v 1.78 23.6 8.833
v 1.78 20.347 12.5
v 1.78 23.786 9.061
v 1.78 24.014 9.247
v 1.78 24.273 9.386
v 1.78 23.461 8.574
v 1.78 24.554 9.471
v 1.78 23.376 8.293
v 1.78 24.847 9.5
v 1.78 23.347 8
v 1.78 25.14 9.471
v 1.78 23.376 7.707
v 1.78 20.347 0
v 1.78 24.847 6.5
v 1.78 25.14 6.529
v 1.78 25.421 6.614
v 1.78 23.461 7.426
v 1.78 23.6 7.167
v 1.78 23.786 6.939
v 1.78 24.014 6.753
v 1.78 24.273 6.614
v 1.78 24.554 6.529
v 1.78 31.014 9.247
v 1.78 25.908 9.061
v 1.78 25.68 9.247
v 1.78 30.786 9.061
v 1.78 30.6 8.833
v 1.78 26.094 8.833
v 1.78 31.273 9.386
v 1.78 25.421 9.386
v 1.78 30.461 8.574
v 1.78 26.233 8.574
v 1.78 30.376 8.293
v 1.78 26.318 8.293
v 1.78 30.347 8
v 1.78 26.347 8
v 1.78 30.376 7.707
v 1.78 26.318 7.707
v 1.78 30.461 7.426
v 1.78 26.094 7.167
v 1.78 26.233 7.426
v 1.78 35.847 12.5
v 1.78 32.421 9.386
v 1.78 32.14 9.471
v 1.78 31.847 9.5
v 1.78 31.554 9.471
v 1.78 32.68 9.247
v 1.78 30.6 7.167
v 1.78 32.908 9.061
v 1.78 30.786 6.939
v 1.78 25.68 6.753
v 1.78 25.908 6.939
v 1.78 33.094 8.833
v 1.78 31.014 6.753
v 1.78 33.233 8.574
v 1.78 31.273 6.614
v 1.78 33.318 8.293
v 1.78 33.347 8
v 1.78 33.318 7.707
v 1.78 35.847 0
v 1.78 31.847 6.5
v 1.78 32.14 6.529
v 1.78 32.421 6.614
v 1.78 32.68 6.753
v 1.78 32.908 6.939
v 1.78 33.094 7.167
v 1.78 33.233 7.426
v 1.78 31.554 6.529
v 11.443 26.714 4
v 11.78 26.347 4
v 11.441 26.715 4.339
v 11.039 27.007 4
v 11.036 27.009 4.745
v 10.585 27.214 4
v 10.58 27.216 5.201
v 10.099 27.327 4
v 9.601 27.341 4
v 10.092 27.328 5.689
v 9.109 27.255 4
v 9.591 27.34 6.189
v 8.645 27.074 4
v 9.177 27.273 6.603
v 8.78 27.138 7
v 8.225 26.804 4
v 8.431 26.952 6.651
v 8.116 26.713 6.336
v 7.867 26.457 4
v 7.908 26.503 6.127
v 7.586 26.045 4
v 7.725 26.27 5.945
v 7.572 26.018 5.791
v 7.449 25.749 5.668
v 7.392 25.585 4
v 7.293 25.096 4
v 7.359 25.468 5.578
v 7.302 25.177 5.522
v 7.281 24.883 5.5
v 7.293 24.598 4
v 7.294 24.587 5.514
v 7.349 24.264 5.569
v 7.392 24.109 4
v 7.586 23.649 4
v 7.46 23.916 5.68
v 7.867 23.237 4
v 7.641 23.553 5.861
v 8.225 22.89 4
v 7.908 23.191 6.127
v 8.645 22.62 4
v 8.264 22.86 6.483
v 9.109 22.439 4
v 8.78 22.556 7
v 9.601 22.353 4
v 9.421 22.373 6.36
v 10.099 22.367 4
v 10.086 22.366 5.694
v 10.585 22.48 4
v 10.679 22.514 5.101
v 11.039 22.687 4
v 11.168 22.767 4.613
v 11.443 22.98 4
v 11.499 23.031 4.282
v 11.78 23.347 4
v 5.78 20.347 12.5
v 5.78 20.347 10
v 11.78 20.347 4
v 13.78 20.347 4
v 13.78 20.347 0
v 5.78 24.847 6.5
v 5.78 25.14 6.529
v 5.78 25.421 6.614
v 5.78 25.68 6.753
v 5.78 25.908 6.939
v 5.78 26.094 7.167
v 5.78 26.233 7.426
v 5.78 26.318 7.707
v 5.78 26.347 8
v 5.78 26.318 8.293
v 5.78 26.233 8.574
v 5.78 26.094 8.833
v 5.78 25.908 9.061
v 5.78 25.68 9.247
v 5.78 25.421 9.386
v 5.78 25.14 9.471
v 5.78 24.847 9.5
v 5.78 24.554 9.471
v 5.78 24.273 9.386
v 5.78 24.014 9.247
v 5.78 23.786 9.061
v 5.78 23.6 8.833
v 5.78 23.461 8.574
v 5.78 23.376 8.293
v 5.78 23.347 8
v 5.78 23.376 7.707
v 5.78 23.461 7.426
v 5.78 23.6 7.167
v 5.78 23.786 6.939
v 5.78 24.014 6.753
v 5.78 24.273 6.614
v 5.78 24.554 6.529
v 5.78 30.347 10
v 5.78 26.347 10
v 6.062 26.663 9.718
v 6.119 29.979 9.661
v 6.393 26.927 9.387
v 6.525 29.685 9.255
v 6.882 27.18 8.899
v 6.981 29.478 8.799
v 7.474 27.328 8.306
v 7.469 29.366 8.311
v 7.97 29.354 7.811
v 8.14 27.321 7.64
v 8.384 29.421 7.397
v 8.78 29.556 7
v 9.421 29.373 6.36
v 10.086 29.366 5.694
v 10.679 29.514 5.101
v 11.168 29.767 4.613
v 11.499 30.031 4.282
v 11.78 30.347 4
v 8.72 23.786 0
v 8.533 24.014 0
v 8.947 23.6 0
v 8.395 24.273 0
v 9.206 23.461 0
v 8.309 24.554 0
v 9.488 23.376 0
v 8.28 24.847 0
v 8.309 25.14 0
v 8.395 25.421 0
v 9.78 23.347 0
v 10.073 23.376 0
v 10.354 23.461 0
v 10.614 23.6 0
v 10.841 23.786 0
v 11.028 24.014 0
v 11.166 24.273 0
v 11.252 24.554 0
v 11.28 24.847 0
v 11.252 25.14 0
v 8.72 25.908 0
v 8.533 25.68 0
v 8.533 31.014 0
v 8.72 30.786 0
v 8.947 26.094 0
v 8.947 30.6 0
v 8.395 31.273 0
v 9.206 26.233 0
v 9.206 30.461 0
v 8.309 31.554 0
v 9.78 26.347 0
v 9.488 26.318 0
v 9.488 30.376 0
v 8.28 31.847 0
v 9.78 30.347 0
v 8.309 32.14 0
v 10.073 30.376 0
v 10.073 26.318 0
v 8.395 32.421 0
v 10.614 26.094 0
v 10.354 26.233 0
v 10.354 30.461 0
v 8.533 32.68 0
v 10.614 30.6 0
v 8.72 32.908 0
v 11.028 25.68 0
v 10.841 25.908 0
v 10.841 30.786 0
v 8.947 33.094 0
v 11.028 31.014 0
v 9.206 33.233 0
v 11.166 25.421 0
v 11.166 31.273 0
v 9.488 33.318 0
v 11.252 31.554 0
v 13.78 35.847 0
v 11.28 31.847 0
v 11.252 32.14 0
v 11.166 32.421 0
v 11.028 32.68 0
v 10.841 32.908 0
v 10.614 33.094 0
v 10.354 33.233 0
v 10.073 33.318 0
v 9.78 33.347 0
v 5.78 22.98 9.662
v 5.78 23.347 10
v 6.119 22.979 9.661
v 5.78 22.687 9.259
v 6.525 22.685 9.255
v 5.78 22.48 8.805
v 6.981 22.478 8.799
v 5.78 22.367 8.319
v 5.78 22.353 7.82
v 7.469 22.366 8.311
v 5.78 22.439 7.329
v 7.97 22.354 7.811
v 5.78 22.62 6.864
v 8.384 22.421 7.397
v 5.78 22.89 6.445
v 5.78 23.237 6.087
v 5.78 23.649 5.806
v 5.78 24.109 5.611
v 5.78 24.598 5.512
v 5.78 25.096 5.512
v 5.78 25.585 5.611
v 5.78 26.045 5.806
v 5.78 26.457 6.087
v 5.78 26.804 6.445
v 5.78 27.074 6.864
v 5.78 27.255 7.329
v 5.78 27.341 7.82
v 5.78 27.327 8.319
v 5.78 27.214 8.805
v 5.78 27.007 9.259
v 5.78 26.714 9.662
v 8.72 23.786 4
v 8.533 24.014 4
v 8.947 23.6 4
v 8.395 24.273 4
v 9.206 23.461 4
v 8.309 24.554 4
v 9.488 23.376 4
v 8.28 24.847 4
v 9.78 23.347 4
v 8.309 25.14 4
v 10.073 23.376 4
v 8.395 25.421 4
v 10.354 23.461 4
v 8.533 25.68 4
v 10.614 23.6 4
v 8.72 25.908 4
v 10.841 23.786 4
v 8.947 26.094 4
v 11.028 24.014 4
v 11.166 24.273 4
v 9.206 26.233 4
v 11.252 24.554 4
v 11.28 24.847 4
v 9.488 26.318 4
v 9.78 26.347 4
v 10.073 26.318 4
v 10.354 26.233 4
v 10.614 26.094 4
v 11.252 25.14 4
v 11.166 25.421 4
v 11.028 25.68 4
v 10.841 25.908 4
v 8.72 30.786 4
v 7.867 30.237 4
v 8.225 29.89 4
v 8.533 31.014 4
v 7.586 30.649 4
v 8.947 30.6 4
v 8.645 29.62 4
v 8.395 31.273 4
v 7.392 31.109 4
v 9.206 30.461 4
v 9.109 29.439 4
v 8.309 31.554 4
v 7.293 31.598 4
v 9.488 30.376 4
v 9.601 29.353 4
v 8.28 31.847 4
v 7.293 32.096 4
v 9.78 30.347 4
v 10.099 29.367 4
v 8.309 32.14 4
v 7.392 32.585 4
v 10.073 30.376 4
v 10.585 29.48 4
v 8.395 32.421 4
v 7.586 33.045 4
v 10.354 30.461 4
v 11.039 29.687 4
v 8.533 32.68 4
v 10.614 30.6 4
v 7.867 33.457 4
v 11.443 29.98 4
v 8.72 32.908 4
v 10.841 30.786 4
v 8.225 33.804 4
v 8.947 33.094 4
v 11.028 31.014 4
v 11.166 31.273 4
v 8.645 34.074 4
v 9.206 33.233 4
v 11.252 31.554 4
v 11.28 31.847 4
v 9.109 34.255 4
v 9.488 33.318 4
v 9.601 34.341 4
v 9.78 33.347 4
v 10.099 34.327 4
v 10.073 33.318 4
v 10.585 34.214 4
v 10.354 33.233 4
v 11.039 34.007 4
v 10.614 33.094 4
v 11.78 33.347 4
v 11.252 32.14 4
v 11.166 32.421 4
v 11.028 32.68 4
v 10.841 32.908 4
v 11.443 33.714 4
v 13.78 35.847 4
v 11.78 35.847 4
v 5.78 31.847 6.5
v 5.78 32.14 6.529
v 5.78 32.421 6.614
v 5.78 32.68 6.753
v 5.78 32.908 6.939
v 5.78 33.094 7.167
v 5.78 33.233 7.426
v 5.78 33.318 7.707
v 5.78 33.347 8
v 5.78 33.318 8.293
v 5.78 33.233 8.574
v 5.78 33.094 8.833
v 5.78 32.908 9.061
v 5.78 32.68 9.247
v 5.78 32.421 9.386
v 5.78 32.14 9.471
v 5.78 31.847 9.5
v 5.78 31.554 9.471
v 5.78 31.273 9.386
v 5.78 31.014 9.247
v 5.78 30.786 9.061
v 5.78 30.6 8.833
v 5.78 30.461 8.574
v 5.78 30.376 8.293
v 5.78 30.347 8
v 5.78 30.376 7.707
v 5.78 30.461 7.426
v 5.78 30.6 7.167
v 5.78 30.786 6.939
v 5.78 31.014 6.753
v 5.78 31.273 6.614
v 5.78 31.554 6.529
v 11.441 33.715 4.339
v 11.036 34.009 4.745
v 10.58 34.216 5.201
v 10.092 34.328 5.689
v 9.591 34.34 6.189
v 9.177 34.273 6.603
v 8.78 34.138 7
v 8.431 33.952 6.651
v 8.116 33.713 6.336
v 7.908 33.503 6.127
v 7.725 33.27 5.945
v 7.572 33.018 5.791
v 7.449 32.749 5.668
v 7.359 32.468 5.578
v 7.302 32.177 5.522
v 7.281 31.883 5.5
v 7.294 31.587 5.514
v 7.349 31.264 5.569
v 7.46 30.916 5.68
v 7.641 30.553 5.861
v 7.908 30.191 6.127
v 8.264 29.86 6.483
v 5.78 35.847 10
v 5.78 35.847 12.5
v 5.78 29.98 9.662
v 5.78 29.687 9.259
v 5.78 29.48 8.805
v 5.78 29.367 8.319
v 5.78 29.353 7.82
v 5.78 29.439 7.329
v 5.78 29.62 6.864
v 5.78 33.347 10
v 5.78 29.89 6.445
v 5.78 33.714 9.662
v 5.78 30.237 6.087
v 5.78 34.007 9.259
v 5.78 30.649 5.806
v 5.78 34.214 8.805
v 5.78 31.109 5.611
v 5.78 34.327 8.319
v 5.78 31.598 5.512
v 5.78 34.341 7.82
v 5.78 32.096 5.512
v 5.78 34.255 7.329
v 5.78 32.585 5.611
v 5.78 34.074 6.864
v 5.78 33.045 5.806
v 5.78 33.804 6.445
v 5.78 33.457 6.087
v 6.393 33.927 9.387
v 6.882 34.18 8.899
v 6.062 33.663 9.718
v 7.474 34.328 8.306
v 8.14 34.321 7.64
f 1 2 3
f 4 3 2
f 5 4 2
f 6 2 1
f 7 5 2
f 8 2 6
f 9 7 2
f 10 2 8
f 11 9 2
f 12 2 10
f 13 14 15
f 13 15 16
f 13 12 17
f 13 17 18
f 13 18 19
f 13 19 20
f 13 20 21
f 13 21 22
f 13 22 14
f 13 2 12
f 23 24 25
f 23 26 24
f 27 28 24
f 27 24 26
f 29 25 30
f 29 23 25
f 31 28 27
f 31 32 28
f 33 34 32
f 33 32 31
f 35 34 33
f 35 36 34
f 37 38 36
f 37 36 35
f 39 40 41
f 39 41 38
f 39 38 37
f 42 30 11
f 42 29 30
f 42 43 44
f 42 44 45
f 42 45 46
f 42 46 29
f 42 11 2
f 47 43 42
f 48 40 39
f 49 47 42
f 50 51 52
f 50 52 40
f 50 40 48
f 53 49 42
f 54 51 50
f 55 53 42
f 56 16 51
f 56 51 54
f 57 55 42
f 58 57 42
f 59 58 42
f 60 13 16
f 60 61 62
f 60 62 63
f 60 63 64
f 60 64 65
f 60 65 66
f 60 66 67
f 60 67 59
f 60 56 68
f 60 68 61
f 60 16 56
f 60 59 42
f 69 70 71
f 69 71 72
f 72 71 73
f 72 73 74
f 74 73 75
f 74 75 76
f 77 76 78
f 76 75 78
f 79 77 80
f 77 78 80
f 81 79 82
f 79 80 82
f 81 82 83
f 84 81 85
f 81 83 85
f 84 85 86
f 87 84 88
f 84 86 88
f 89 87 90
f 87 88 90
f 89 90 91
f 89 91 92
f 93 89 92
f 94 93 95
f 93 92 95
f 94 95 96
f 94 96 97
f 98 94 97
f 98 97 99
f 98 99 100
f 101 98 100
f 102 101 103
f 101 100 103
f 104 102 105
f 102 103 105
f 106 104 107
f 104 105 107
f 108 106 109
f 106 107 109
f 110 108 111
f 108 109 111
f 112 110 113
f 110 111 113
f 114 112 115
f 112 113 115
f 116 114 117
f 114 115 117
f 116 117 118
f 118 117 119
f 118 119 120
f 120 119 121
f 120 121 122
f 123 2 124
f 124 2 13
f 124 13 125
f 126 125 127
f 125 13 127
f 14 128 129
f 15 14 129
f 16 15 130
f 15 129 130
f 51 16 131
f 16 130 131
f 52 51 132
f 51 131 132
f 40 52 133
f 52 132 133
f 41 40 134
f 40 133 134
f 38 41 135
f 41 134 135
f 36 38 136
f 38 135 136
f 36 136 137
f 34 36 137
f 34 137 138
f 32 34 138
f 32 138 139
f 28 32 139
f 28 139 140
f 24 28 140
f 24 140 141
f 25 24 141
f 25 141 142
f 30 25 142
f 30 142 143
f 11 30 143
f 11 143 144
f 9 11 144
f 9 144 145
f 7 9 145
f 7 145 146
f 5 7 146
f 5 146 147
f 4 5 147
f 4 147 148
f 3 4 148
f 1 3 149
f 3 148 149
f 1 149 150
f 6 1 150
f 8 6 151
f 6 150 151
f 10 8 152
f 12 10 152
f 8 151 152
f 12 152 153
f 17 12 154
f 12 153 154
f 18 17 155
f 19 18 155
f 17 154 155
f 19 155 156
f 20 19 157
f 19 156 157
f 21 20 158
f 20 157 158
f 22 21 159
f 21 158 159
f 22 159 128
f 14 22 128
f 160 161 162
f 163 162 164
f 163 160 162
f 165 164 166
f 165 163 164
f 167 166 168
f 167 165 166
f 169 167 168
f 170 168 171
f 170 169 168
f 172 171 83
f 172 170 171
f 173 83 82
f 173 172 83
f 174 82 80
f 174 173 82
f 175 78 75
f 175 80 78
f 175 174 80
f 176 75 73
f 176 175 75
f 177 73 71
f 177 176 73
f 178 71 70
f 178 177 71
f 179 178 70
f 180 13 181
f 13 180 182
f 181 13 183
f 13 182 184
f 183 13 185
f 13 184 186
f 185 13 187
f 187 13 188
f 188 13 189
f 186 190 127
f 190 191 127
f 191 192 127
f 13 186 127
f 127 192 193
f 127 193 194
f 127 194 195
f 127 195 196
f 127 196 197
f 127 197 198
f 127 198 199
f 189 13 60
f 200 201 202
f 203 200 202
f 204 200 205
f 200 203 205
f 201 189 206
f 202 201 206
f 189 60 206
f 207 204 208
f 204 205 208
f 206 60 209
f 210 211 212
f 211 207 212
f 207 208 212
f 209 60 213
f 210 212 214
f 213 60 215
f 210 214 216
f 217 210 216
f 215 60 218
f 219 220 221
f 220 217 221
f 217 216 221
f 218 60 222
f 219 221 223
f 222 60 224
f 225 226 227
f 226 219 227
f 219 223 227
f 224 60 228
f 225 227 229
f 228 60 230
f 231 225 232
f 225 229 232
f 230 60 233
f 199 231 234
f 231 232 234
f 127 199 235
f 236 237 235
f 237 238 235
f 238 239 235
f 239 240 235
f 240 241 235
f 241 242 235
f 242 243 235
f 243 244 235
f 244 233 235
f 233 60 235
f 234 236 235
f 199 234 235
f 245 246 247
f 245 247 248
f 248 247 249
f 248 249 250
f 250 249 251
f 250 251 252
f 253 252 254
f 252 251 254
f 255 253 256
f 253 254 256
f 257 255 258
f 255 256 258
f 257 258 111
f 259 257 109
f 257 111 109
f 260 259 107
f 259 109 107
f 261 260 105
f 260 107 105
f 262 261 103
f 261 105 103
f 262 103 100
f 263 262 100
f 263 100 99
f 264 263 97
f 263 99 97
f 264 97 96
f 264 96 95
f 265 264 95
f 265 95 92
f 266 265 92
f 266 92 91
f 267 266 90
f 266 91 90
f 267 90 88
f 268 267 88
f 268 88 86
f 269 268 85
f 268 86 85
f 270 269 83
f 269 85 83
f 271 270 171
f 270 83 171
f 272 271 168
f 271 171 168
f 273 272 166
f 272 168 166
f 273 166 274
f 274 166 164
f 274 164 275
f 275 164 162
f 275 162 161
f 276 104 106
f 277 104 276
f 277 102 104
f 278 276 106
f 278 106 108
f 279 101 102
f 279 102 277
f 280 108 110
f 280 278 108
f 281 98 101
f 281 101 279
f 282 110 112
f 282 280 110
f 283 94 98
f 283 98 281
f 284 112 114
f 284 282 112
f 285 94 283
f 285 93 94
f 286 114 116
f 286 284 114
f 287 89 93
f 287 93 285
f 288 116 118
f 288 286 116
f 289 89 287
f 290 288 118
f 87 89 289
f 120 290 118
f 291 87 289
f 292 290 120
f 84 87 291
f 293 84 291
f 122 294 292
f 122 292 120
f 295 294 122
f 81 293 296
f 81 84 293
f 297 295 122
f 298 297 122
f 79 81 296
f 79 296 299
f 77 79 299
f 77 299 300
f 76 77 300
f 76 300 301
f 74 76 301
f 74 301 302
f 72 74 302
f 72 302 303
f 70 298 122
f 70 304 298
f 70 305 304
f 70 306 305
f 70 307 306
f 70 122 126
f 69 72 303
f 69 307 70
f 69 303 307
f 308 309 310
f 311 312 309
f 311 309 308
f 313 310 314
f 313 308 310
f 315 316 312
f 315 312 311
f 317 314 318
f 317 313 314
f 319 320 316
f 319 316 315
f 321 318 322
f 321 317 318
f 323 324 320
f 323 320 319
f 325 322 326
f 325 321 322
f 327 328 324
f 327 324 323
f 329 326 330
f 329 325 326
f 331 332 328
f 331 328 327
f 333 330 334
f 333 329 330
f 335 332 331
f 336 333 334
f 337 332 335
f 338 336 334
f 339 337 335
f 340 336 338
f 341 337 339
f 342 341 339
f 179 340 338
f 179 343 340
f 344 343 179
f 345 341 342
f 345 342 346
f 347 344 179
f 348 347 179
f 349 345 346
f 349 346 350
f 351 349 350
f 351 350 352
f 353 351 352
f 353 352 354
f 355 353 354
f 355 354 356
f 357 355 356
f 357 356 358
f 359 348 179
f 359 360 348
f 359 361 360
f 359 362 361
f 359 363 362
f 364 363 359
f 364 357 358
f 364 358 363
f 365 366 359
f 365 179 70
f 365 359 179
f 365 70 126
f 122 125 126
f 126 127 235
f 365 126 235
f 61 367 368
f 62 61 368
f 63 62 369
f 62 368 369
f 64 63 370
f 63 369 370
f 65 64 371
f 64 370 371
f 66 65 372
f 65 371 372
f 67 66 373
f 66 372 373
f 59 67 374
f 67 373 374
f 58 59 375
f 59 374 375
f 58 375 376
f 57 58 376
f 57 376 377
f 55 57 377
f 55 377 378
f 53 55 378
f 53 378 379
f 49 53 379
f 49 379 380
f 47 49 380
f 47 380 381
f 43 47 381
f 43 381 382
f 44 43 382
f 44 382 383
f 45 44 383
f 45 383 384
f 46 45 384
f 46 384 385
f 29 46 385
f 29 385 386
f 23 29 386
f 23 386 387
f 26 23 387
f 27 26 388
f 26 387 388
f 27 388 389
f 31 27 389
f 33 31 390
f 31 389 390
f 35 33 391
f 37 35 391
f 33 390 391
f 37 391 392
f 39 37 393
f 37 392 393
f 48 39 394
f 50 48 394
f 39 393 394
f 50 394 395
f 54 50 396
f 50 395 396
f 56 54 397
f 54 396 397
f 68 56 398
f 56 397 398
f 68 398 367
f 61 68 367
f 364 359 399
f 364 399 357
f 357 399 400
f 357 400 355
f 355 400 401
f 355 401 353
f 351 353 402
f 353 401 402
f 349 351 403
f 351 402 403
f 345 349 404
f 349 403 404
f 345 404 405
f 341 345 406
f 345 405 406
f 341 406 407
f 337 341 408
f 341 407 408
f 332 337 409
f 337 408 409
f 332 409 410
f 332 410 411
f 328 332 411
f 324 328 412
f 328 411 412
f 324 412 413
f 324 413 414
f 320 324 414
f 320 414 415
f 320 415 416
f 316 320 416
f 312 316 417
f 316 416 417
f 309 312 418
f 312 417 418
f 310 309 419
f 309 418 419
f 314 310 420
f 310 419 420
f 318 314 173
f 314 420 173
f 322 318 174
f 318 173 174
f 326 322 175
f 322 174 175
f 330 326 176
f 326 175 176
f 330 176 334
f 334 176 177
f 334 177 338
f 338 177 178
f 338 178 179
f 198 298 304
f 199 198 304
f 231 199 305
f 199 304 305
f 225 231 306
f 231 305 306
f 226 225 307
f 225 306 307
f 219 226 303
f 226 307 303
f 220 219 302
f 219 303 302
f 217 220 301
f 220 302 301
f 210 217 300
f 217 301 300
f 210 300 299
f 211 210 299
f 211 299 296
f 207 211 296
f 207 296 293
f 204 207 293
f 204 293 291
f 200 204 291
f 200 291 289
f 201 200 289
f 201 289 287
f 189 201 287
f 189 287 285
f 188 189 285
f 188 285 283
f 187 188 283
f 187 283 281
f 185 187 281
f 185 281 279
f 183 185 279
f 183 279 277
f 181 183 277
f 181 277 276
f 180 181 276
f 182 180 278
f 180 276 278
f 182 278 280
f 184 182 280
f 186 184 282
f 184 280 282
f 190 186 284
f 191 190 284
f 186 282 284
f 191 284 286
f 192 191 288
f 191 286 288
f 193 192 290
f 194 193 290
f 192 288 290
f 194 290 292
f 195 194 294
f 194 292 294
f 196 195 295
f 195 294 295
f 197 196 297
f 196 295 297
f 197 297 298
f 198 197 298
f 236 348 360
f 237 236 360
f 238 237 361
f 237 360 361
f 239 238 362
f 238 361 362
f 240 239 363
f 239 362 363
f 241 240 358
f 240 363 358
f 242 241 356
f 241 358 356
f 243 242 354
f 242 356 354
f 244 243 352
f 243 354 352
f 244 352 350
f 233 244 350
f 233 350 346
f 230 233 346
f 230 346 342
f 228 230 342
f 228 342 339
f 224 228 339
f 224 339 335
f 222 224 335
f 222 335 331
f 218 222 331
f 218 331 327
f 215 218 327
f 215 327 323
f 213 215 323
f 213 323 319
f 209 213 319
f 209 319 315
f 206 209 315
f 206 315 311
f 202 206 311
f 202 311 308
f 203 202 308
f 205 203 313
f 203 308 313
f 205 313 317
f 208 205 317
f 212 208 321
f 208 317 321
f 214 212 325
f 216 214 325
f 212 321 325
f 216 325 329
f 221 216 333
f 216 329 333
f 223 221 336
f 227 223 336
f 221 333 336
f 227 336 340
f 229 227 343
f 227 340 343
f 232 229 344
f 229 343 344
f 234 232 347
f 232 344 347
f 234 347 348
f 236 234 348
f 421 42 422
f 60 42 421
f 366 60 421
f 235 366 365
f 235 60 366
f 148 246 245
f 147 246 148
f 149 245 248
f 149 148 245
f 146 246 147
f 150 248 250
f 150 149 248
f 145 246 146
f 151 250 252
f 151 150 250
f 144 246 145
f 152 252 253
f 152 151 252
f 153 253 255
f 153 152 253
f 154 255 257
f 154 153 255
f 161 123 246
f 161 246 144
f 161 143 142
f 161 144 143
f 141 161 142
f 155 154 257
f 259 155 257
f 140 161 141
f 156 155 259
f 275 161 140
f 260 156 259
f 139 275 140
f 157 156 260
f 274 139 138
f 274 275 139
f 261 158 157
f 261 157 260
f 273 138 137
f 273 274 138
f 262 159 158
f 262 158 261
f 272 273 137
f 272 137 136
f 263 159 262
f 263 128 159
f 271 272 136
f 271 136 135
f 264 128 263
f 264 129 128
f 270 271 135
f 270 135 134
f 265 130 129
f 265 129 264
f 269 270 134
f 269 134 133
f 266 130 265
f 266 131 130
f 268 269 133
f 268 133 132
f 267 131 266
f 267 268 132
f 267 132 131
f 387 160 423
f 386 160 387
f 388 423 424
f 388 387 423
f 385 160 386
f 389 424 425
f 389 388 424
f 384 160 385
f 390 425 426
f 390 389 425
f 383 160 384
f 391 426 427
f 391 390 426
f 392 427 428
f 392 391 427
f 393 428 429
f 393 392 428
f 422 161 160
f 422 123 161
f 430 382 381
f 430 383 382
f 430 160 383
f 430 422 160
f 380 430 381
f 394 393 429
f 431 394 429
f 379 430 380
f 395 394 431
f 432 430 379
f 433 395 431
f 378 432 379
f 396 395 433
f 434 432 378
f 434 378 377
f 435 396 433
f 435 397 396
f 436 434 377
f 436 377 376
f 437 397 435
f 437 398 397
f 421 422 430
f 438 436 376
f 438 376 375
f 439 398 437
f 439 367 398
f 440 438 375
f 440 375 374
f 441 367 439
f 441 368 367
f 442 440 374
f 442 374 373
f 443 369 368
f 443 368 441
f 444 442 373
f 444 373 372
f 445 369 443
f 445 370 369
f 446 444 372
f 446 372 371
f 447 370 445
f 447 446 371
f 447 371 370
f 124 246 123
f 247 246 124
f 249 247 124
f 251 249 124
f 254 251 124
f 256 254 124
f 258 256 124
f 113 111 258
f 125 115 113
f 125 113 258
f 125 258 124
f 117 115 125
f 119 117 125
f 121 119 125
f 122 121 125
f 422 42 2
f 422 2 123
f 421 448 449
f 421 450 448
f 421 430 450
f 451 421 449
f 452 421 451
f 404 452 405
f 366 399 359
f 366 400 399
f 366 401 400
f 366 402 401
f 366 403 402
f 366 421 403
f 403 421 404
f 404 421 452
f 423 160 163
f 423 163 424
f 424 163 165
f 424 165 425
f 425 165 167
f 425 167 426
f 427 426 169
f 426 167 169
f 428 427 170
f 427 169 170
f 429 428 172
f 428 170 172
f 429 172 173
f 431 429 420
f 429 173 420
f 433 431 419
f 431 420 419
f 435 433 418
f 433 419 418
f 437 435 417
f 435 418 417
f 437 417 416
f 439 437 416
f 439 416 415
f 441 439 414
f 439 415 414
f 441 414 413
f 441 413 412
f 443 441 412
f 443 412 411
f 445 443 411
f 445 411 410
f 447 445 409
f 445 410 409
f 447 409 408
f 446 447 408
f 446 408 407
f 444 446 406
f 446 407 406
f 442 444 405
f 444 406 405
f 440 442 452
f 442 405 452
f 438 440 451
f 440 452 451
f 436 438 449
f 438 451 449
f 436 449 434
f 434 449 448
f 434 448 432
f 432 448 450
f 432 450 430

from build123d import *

# Parameters (mm, degrees)
SKETCH1_W           = 12
SKETCH1_H           = 15.5
BOSS_EXTRUDE1_DEPTH = 4
SKETCH2_W           = 4
SKETCH2_H           = 15.5
BOSS_EXTRUDE2_DEPTH = 8.5
SKETCH3_R           = 1.5
CUT_EXTRUDE1_DEPTH  = 5
SKETCH4_R           = 1.5
CUT_EXTRUDE2_DEPTH  = 5
BOSS_EXTRUDE3_DEPTH = 15.5
SKETCH6_R           = 2.5
CUT_EXTRUDE3_DEPTH  = 8
SKETCH7_R           = 2.5
CUT_EXTRUDE4_DEPTH  = 8.5


with BuildPart() as part:
    # Sketch1 → Boss-Extrude1 (new body)
    with BuildSketch(Plane.XY):
        with Locations((7.780385216, 28.096978354)):
            Rectangle(SKETCH1_W, SKETCH1_H)
    extrude(amount=BOSS_EXTRUDE1_DEPTH)

    # Sketch2 → Boss-Extrude2 (add)
    with BuildSketch(Plane.XY.offset(4)):
        with Locations((3.780385216, 28.096978354)):
            Rectangle(SKETCH2_W, SKETCH2_H)
    extrude(amount=BOSS_EXTRUDE2_DEPTH)

    # Sketch3 → Cut-Extrude1 (cut)
    with BuildSketch(Plane(origin=(5.780385216, 0, 0), x_dir=(0, 0, -1), z_dir=(1, 0, 0))):
        with Locations((-8, 24.846978354)):
            Circle(SKETCH3_R)
        with Locations((-8, 31.846978354)):
            Circle(SKETCH3_R)
    extrude(amount=-CUT_EXTRUDE1_DEPTH, mode=Mode.SUBTRACT)

    # Sketch4 → Cut-Extrude2 (cut)
    with BuildSketch(Plane.XY.offset(4)):
        with Locations((9.780385216, 24.846978354)):
            Circle(SKETCH4_R)
        with Locations((9.780385216, 31.846978354)):
            Circle(SKETCH4_R)
    extrude(amount=-CUT_EXTRUDE2_DEPTH, mode=Mode.SUBTRACT)

    # Sketch5 → Boss-Extrude3 (add)
    with BuildSketch(Plane(origin=(0, 35.846978354, 0), x_dir=(1, 0, 0), z_dir=(0, 1, 0))):
        Polygon((5.780385216, -4), (5.780385216, -10), (11.780385216, -4), align=None)
    extrude(amount=-BOSS_EXTRUDE3_DEPTH)

    # Sketch6 → Cut-Extrude3 (cut)
    with BuildSketch(Plane(origin=(13.780385216, 0, 0), x_dir=(0, 0, -1), z_dir=(1, 0, 0))):
        with Locations((-8, 31.846978354)):
            Circle(SKETCH6_R)
        with Locations((-8, 24.846978354)):
            Circle(SKETCH6_R)
    extrude(amount=-CUT_EXTRUDE3_DEPTH, mode=Mode.SUBTRACT)

    # Sketch7 → Cut-Extrude4 (cut)
    with BuildSketch(Plane.XY.offset(12.5)):
        with Locations((9.780385216, 31.846978354)):
            Circle(SKETCH7_R)
        with Locations((9.780385216, 24.846978354)):
            Circle(SKETCH7_R)
    extrude(amount=-CUT_EXTRUDE4_DEPTH, mode=Mode.SUBTRACT)


solid = part.part
